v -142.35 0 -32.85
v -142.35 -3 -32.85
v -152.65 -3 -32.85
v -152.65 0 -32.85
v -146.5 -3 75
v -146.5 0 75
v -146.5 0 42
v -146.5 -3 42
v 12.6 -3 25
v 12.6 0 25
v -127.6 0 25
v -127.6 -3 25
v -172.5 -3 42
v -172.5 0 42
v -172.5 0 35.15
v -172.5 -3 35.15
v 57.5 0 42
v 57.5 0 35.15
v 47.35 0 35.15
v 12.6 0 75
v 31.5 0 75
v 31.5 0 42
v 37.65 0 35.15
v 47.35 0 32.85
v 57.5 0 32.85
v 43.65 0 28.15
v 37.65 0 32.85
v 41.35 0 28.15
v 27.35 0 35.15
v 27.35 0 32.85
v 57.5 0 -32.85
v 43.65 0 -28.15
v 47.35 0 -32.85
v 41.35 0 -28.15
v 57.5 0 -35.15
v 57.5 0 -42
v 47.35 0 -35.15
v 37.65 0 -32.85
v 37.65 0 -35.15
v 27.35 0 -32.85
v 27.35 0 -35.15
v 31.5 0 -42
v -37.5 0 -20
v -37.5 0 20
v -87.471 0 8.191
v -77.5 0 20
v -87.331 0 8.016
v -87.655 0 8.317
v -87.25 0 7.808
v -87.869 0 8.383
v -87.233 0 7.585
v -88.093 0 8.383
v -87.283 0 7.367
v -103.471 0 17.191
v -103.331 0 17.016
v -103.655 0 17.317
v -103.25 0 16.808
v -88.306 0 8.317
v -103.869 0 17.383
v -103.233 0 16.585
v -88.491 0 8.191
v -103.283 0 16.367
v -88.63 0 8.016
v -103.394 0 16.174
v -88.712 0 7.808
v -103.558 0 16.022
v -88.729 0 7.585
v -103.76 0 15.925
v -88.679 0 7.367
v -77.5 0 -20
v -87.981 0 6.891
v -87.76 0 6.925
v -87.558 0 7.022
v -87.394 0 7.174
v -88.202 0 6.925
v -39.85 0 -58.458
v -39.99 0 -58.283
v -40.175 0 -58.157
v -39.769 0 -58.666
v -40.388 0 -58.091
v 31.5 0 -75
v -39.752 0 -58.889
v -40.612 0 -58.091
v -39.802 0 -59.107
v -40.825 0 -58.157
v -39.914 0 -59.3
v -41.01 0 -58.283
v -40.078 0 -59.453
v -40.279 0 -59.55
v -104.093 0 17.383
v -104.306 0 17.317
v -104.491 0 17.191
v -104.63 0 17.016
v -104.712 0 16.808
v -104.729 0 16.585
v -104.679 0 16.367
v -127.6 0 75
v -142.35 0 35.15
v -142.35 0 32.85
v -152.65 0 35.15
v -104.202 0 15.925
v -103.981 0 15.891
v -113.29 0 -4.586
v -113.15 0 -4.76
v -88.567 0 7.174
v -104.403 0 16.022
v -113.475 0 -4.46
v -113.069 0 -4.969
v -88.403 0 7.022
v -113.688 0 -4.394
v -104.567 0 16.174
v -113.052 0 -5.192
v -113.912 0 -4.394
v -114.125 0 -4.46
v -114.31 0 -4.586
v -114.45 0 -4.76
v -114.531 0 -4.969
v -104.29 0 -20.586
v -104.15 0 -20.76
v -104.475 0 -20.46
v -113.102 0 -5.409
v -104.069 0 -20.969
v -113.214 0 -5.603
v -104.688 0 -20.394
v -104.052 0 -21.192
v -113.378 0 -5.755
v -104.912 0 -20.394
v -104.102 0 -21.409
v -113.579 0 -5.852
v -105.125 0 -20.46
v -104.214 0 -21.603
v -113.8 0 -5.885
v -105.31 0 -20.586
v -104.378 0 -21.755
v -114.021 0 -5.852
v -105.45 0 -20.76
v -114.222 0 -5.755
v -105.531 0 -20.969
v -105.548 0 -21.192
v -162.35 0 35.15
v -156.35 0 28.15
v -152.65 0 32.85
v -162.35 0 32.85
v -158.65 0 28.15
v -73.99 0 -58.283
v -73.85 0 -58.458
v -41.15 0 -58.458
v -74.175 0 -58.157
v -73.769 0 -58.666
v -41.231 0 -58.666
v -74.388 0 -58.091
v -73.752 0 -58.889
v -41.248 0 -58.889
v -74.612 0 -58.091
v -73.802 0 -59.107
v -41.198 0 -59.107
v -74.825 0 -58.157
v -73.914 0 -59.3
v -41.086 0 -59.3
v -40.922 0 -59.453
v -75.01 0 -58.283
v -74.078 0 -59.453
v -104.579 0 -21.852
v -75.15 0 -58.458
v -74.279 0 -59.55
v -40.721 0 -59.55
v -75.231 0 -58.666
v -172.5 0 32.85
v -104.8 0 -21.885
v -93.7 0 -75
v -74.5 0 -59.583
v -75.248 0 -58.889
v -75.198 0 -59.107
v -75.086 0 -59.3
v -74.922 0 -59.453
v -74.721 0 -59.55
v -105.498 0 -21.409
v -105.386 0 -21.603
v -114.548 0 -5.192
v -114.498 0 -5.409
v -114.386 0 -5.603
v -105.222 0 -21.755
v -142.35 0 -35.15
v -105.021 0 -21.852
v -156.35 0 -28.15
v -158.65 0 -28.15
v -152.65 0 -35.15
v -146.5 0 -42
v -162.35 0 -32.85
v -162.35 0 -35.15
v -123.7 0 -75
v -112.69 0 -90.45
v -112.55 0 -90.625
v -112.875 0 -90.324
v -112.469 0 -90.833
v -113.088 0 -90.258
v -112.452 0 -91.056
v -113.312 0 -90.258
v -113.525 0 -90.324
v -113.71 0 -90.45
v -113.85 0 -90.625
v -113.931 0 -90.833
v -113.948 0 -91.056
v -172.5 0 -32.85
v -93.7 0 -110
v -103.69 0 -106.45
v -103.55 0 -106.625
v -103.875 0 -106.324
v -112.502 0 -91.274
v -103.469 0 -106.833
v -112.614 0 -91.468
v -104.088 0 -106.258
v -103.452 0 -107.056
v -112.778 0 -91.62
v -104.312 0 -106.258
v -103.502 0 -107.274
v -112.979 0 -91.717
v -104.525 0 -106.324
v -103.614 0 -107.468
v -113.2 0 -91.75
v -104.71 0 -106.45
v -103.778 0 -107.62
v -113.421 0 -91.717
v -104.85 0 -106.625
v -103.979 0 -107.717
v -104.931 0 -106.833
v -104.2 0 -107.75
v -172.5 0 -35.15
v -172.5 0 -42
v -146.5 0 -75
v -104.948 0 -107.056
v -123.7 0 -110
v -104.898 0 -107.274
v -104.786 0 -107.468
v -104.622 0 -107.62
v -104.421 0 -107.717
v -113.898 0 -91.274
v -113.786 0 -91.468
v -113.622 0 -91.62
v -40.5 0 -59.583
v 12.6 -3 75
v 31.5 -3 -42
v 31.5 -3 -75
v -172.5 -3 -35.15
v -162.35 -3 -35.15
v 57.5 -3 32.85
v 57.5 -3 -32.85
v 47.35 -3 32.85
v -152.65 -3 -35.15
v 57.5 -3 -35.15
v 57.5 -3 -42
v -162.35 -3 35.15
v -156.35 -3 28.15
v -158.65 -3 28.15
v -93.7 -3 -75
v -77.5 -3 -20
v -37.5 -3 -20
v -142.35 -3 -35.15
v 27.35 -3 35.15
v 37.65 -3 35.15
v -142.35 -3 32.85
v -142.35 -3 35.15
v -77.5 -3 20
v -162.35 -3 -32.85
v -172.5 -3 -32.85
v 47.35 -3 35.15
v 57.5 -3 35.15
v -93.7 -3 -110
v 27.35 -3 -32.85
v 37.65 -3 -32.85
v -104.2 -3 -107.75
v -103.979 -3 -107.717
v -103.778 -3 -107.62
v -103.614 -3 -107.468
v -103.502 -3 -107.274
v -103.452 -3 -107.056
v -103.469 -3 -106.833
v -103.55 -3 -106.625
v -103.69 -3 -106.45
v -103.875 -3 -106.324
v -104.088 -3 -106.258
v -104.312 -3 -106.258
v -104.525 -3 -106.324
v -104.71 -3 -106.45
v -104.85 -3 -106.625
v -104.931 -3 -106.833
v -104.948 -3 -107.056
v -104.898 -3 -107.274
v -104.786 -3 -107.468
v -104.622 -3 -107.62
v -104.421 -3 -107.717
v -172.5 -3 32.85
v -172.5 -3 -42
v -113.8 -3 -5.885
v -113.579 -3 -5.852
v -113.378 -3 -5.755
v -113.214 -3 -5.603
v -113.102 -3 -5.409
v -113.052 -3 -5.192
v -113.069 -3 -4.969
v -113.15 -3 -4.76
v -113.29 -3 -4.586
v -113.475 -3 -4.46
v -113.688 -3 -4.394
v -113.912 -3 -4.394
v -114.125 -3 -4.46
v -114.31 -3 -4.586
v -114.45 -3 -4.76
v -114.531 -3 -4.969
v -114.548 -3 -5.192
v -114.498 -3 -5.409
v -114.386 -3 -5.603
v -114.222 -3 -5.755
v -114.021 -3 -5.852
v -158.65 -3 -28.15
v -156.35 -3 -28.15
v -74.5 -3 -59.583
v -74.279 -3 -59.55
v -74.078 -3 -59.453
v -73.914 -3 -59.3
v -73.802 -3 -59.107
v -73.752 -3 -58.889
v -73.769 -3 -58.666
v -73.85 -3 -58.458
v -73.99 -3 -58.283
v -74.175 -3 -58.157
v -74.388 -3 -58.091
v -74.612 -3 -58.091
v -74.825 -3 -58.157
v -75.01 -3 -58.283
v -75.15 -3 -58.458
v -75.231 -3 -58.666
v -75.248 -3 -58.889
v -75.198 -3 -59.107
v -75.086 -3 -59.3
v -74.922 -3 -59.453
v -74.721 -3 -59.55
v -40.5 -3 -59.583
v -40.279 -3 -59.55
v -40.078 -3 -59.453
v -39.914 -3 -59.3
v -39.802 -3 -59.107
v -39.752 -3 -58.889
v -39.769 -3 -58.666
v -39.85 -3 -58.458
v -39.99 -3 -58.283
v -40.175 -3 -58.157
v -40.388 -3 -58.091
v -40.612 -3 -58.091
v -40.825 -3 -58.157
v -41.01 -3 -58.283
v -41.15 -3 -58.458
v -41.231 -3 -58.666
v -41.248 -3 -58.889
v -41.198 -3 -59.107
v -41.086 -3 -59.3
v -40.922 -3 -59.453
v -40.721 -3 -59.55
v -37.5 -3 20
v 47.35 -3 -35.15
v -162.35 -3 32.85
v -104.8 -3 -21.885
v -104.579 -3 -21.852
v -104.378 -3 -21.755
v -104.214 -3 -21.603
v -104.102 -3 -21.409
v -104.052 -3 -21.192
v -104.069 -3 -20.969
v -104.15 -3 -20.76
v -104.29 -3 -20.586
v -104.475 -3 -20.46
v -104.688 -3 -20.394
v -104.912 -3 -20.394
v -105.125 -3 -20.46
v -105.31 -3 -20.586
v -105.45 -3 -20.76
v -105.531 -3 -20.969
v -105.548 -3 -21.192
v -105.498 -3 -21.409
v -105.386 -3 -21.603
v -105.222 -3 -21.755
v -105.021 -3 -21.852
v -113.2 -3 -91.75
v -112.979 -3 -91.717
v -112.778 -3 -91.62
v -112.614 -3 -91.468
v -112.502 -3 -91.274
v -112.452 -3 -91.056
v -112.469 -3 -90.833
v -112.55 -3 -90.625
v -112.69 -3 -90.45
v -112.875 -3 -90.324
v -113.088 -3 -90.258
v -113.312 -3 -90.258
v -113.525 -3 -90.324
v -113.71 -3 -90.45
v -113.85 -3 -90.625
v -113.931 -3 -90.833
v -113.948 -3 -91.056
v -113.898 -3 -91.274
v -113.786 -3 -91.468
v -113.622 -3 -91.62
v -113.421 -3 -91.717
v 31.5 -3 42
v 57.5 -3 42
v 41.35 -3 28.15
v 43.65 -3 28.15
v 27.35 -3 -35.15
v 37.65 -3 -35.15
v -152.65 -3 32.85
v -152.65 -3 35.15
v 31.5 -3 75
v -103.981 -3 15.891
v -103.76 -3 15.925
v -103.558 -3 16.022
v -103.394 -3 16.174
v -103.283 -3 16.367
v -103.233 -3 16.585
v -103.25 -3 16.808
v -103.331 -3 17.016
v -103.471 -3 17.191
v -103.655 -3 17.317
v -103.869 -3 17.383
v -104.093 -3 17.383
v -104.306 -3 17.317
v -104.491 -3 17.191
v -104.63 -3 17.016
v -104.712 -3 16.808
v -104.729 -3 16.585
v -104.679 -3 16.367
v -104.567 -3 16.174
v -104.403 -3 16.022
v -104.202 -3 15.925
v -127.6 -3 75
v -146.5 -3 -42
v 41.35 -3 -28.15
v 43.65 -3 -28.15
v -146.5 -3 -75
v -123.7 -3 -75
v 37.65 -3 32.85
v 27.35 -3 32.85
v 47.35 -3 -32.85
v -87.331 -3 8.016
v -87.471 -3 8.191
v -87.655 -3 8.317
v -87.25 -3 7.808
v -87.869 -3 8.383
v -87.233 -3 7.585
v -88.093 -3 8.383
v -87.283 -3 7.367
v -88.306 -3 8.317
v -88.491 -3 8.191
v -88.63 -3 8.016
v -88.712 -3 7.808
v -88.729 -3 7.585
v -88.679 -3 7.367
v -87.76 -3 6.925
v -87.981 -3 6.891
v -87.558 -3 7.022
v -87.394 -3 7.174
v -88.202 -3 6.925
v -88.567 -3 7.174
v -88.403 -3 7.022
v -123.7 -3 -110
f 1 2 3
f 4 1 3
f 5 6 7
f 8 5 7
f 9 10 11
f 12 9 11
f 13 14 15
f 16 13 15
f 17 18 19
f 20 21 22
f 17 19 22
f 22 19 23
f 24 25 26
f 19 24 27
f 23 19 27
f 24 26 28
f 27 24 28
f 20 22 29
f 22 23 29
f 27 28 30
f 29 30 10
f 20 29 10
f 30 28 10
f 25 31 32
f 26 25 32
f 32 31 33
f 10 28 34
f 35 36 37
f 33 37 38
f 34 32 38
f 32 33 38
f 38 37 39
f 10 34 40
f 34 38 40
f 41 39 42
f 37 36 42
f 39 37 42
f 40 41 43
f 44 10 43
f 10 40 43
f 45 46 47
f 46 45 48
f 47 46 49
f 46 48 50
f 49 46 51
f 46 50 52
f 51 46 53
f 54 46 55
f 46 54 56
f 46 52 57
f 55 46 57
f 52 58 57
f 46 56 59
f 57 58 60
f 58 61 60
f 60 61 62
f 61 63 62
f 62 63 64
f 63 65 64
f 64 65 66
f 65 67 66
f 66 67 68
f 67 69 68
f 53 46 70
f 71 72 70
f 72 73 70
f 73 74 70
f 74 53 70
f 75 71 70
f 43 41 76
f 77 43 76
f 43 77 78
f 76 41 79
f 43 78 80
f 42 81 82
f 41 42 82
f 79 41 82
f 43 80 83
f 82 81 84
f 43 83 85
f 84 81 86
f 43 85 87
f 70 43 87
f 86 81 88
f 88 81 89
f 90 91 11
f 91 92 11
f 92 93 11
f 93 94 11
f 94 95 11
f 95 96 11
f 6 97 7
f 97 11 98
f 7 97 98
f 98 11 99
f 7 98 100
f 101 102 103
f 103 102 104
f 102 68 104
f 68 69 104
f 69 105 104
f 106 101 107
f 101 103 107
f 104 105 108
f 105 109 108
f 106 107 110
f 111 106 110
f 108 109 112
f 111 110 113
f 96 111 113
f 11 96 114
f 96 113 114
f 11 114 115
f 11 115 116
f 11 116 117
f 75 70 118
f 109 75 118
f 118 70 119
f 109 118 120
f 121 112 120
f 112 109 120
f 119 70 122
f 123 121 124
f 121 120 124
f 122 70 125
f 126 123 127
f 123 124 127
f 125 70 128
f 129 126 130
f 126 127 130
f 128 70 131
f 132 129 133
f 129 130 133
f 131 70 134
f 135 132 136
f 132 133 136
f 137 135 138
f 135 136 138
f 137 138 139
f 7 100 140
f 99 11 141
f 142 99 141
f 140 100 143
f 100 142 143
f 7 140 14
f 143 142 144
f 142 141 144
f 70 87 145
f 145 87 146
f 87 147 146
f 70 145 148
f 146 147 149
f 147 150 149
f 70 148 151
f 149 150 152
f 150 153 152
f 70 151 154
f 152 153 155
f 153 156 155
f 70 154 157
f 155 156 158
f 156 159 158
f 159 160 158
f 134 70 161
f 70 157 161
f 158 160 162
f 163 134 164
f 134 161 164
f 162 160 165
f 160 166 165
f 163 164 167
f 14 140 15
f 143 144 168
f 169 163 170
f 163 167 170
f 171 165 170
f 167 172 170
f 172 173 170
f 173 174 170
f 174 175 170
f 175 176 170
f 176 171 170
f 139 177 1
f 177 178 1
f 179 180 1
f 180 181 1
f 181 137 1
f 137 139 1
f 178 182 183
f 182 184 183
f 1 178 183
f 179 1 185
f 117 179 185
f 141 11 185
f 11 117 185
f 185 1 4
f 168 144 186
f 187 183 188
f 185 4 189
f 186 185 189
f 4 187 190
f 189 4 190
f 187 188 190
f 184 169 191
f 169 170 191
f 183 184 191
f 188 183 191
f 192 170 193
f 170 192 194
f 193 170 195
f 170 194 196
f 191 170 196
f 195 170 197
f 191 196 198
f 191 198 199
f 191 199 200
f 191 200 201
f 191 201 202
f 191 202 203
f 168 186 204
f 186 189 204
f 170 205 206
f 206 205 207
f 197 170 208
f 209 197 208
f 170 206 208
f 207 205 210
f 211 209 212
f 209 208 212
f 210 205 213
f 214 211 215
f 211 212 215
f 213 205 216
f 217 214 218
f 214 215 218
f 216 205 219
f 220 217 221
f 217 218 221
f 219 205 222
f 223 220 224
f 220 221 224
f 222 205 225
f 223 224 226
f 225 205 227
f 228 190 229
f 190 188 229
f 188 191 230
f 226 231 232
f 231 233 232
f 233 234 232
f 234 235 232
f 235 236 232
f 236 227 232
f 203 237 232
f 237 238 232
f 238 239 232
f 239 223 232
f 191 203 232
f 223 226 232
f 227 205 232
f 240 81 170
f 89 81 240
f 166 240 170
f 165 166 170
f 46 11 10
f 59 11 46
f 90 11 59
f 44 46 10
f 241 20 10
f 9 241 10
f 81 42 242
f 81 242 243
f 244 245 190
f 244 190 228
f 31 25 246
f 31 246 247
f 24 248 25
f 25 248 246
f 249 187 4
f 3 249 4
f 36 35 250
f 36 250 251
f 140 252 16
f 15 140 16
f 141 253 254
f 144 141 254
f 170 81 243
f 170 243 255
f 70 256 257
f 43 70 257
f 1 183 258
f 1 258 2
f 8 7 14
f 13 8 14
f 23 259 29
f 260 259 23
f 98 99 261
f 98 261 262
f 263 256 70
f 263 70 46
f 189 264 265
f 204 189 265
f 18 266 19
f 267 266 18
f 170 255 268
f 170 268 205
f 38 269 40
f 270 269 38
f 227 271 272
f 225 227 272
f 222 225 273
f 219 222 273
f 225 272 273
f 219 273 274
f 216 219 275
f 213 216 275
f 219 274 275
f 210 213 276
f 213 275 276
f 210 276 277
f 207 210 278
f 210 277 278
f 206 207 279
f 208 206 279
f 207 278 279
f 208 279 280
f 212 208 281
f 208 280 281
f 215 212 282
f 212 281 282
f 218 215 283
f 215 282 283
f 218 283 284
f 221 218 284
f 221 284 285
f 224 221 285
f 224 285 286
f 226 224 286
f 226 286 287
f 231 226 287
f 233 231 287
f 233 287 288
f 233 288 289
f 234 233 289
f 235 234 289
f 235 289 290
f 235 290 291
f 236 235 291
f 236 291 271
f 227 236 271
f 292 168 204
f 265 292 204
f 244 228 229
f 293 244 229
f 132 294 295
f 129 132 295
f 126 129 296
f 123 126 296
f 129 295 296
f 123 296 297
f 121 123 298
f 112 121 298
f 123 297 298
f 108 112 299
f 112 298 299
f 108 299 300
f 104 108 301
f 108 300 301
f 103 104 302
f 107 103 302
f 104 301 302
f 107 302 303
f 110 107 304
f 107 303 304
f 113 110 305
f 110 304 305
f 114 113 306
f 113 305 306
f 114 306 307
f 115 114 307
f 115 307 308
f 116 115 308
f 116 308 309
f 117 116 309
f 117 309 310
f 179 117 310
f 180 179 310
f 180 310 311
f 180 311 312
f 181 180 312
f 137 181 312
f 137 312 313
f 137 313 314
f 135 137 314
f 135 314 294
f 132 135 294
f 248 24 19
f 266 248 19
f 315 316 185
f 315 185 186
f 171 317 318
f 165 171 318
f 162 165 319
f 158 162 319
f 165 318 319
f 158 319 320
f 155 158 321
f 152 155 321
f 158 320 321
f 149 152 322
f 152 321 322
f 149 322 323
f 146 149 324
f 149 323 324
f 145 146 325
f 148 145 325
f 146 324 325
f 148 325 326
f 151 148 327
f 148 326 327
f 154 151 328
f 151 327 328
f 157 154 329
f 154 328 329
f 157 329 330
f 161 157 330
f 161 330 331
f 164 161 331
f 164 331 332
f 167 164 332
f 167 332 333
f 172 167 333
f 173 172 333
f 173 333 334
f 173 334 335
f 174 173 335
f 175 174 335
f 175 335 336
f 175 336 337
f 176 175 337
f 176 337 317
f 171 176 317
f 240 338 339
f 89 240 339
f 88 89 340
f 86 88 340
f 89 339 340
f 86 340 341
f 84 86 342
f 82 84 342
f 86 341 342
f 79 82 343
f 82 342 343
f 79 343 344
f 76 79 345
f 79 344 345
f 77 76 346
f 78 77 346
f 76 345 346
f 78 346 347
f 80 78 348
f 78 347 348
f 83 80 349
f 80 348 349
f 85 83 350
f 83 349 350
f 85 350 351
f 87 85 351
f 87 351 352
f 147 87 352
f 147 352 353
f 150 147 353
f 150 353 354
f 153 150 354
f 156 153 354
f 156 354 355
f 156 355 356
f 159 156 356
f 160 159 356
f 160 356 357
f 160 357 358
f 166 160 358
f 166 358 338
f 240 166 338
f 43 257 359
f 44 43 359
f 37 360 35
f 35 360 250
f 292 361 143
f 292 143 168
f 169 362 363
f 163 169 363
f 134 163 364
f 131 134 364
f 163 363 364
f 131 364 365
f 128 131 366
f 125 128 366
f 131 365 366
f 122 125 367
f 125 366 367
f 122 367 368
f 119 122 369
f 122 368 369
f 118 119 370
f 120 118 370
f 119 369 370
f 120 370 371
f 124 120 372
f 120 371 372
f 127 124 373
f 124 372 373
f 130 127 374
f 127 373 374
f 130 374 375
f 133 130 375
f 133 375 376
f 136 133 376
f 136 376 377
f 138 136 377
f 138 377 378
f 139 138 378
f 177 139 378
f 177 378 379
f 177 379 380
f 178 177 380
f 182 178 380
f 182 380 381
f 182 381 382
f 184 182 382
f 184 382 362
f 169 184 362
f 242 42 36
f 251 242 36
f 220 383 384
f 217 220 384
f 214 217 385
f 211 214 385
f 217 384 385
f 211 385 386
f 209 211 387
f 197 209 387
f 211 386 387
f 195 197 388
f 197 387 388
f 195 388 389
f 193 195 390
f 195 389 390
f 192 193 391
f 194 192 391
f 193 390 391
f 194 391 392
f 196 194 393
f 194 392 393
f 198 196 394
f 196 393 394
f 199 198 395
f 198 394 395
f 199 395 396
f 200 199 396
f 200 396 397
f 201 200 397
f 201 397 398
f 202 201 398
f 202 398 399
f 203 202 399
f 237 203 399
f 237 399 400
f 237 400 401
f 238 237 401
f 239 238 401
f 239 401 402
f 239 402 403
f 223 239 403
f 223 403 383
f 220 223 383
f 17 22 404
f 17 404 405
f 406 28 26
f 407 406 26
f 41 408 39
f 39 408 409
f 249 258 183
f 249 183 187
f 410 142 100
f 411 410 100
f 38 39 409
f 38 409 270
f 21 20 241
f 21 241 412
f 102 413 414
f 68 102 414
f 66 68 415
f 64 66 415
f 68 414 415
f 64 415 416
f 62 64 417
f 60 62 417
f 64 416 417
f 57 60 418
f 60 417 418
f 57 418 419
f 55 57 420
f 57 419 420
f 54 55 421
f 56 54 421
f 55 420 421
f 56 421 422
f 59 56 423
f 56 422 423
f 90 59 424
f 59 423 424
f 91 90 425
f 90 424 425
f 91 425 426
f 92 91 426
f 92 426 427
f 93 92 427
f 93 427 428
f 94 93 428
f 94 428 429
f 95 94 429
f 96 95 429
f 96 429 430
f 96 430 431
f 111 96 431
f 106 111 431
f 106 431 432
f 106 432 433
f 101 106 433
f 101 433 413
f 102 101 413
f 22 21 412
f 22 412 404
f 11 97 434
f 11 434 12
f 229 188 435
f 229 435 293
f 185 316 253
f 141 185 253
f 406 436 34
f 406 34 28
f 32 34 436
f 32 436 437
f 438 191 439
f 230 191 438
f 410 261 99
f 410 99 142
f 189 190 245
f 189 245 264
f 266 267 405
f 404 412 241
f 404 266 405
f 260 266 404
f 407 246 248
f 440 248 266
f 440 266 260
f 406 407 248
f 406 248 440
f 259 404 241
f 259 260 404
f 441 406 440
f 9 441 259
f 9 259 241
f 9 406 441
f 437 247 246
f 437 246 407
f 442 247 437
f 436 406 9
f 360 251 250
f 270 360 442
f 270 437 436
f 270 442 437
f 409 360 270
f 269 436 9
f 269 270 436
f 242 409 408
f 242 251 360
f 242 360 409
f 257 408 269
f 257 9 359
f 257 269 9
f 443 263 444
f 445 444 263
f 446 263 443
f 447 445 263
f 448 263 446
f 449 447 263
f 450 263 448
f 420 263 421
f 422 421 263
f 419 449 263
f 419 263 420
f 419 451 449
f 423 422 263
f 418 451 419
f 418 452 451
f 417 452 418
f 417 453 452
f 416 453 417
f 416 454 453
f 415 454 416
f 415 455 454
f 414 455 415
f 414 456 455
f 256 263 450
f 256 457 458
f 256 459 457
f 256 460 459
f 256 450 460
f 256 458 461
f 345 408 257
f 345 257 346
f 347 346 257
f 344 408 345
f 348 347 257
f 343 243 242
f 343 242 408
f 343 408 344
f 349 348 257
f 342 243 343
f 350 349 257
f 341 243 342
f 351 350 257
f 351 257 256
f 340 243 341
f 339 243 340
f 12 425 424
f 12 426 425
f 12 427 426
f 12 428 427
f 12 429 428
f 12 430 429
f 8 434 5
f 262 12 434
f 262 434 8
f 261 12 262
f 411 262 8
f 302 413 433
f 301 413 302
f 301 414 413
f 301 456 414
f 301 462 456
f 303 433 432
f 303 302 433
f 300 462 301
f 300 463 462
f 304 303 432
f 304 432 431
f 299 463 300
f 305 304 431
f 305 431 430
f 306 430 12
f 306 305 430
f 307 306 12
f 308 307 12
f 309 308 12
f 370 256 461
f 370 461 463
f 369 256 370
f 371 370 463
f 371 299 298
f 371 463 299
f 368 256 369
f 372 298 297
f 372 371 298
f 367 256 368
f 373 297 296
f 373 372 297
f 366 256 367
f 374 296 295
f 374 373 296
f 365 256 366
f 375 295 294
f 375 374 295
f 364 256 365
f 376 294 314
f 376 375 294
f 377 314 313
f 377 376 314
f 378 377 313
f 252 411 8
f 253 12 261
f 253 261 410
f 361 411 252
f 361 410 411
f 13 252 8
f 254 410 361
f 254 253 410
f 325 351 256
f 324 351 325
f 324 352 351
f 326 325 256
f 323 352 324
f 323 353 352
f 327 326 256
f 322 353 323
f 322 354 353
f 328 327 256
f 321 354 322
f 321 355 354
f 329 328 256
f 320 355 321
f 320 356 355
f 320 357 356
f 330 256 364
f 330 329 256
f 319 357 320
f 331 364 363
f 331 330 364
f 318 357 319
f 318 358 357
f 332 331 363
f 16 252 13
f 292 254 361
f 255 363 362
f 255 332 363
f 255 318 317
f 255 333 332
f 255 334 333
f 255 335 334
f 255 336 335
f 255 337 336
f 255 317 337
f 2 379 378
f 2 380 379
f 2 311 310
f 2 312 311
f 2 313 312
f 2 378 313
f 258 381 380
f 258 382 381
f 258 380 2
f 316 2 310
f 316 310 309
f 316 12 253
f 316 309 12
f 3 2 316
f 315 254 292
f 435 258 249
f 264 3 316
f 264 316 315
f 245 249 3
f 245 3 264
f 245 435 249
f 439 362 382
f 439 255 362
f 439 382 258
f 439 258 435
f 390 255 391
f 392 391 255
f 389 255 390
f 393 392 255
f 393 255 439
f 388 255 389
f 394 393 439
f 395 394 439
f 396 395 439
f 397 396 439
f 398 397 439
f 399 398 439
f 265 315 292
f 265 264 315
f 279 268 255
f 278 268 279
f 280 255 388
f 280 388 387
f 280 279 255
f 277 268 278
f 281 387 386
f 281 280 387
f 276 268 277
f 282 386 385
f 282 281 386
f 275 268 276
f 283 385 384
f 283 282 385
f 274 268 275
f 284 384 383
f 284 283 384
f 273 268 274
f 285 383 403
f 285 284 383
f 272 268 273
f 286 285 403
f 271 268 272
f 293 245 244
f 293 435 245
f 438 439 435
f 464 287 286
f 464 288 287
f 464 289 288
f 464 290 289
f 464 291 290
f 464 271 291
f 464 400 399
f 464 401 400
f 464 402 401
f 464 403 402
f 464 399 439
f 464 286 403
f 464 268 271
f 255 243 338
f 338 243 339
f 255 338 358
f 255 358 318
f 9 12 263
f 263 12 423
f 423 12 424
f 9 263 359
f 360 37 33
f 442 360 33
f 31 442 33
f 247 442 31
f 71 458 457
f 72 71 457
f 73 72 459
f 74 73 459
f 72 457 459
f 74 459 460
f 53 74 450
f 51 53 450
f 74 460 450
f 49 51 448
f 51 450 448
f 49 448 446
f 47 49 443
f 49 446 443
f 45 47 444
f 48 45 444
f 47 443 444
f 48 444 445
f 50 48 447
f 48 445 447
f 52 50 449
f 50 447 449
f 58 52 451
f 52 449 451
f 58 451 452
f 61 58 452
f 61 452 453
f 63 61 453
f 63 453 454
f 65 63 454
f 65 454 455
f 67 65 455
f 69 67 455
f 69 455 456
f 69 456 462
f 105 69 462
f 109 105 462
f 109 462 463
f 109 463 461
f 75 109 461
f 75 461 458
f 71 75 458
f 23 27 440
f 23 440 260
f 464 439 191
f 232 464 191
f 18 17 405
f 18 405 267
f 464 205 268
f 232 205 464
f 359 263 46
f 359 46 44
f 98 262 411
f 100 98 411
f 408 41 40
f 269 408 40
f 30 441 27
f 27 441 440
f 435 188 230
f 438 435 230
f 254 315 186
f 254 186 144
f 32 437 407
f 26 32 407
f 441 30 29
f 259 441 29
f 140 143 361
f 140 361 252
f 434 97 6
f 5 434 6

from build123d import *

# Parameters (mm, degrees)
SKETCH1_W           = 115
SKETCH1_H           = 150
BOSS_EXTRUDE1_DEPTH = 3
SKETCH2_W           = 26
SKETCH2_H           = 66
SKETCH2_W_2         = 70.1
SKETCH2_H_2         = 50
CUT_EXTRUDE1_DEPTH  = 3
SKETCH5_W           = 10.3
SKETCH5_H           = 2.3
SKETCH5_W_2         = 2.3
SKETCH5_H_2         = 56.3
CUT_EXTRUDE2_DEPTH  = 3
SKETCH9_W           = 30
SKETCH9_H           = 3
BOSS_EXTRUDE2_DEPTH = 35
SKETCH8_R           = 0.75
SKETCH8_W           = 40
SKETCH8_H           = 40
CUT_EXTRUDE3_DEPTH  = 205.609994868


with BuildPart() as part:
    # Sketch1 → Boss-Extrude1 (new body)
    with BuildSketch(Plane(origin=(0, 0, 0), x_dir=(1, 0, 0), z_dir=(0, 1, 0))):
        Rectangle(SKETCH1_W, SKETCH1_H)
    extrude(amount=-BOSS_EXTRUDE1_DEPTH)

    # Sketch2 → Cut-Extrude1 (cut)
    with BuildSketch(Plane(origin=(0, 0, 0), x_dir=(1, 0, 0), z_dir=(0, 1, 0))):
        with Locations((44.5, -75)):
            Rectangle(SKETCH2_W, SKETCH2_H)
        with Locations((44.5, 75)):
            Rectangle(SKETCH2_W, SKETCH2_H)
        with Locations((-22.45, -50)):
            Rectangle(SKETCH2_W_2, SKETCH2_H_2)
    extrude(amount=-CUT_EXTRUDE1_DEPTH, mode=Mode.SUBTRACT)

    # Sketch5 → Cut-Extrude2 (cut)
    with BuildSketch(Plane.XZ.offset(3)):
        with Locations((32.5, 34)):
            Rectangle(SKETCH5_W, SKETCH5_H)
        with Locations((42.5, 0)):
            Rectangle(SKETCH5_W_2, SKETCH5_H_2)
        with Locations((52.5, 34)):
            Rectangle(SKETCH5_W, SKETCH5_H)
        with Locations((32.5, -34)):
            Rectangle(SKETCH5_W, SKETCH5_H)
        with Locations((52.5, -34)):
            Rectangle(SKETCH5_W, SKETCH5_H)
    extrude(amount=-CUT_EXTRUDE2_DEPTH, mode=Mode.SUBTRACT)

    # Mirror1: part across plane


with BuildPart() as part_1:
    add(part.part)
    add(part.part.mirror(Plane(origin=(-57.5, -3, 75), x_dir=(0, 0, 1), z_dir=(-1, 0, 0))))

    # Sketch9 → Boss-Extrude2 (add)
    with BuildSketch(Plane(origin=(0, 0, -75), x_dir=(-1, 0, 0), z_dir=(0, 0, -1))):
        with Locations((108.7, -1.5)):
            Rectangle(SKETCH9_W, SKETCH9_H)
    extrude(amount=BOSS_EXTRUDE2_DEPTH)

    # Sketch8 → Cut-Extrude3 (cut, through all)
    with BuildSketch(Plane.XZ.offset(3)):
        with Locations(Location((-74.5, -58.832861148, 0), (0, 0, 270))):
            Circle(SKETCH8_R)
        with Locations(Location((-40.5, -58.832861148, 0), (0, 0, 270))):
            Circle(SKETCH8_R)
        with Locations(Location((-104.8, -21.135456144, 0), (0, 0, 270))):
            Circle(SKETCH8_R)
        with Locations(Location((-113.8, -5.135456144, 0), (0, 0, 270))):
            Circle(SKETCH8_R)
        with Locations(Location((-87.980765301, 7.641432582, 0), (0, 0, 270))):
            Circle(SKETCH8_R)
        with Locations(Location((-103.980765301, 16.641432582, 0), (0, 0, 270))):
            Circle(SKETCH8_R)
        with Locations(Location((-104.2, -107, 0), (0, 0, 270))):
            Circle(SKETCH8_R)
        with Locations(Location((-113.2, -91, 0), (0, 0, 270))):
            Circle(SKETCH8_R)
        with Locations((-57.5, 0)):
            Rectangle(SKETCH8_W, SKETCH8_H)
    extrude(amount=-CUT_EXTRUDE3_DEPTH, mode=Mode.SUBTRACT)


solid = part_1.part
